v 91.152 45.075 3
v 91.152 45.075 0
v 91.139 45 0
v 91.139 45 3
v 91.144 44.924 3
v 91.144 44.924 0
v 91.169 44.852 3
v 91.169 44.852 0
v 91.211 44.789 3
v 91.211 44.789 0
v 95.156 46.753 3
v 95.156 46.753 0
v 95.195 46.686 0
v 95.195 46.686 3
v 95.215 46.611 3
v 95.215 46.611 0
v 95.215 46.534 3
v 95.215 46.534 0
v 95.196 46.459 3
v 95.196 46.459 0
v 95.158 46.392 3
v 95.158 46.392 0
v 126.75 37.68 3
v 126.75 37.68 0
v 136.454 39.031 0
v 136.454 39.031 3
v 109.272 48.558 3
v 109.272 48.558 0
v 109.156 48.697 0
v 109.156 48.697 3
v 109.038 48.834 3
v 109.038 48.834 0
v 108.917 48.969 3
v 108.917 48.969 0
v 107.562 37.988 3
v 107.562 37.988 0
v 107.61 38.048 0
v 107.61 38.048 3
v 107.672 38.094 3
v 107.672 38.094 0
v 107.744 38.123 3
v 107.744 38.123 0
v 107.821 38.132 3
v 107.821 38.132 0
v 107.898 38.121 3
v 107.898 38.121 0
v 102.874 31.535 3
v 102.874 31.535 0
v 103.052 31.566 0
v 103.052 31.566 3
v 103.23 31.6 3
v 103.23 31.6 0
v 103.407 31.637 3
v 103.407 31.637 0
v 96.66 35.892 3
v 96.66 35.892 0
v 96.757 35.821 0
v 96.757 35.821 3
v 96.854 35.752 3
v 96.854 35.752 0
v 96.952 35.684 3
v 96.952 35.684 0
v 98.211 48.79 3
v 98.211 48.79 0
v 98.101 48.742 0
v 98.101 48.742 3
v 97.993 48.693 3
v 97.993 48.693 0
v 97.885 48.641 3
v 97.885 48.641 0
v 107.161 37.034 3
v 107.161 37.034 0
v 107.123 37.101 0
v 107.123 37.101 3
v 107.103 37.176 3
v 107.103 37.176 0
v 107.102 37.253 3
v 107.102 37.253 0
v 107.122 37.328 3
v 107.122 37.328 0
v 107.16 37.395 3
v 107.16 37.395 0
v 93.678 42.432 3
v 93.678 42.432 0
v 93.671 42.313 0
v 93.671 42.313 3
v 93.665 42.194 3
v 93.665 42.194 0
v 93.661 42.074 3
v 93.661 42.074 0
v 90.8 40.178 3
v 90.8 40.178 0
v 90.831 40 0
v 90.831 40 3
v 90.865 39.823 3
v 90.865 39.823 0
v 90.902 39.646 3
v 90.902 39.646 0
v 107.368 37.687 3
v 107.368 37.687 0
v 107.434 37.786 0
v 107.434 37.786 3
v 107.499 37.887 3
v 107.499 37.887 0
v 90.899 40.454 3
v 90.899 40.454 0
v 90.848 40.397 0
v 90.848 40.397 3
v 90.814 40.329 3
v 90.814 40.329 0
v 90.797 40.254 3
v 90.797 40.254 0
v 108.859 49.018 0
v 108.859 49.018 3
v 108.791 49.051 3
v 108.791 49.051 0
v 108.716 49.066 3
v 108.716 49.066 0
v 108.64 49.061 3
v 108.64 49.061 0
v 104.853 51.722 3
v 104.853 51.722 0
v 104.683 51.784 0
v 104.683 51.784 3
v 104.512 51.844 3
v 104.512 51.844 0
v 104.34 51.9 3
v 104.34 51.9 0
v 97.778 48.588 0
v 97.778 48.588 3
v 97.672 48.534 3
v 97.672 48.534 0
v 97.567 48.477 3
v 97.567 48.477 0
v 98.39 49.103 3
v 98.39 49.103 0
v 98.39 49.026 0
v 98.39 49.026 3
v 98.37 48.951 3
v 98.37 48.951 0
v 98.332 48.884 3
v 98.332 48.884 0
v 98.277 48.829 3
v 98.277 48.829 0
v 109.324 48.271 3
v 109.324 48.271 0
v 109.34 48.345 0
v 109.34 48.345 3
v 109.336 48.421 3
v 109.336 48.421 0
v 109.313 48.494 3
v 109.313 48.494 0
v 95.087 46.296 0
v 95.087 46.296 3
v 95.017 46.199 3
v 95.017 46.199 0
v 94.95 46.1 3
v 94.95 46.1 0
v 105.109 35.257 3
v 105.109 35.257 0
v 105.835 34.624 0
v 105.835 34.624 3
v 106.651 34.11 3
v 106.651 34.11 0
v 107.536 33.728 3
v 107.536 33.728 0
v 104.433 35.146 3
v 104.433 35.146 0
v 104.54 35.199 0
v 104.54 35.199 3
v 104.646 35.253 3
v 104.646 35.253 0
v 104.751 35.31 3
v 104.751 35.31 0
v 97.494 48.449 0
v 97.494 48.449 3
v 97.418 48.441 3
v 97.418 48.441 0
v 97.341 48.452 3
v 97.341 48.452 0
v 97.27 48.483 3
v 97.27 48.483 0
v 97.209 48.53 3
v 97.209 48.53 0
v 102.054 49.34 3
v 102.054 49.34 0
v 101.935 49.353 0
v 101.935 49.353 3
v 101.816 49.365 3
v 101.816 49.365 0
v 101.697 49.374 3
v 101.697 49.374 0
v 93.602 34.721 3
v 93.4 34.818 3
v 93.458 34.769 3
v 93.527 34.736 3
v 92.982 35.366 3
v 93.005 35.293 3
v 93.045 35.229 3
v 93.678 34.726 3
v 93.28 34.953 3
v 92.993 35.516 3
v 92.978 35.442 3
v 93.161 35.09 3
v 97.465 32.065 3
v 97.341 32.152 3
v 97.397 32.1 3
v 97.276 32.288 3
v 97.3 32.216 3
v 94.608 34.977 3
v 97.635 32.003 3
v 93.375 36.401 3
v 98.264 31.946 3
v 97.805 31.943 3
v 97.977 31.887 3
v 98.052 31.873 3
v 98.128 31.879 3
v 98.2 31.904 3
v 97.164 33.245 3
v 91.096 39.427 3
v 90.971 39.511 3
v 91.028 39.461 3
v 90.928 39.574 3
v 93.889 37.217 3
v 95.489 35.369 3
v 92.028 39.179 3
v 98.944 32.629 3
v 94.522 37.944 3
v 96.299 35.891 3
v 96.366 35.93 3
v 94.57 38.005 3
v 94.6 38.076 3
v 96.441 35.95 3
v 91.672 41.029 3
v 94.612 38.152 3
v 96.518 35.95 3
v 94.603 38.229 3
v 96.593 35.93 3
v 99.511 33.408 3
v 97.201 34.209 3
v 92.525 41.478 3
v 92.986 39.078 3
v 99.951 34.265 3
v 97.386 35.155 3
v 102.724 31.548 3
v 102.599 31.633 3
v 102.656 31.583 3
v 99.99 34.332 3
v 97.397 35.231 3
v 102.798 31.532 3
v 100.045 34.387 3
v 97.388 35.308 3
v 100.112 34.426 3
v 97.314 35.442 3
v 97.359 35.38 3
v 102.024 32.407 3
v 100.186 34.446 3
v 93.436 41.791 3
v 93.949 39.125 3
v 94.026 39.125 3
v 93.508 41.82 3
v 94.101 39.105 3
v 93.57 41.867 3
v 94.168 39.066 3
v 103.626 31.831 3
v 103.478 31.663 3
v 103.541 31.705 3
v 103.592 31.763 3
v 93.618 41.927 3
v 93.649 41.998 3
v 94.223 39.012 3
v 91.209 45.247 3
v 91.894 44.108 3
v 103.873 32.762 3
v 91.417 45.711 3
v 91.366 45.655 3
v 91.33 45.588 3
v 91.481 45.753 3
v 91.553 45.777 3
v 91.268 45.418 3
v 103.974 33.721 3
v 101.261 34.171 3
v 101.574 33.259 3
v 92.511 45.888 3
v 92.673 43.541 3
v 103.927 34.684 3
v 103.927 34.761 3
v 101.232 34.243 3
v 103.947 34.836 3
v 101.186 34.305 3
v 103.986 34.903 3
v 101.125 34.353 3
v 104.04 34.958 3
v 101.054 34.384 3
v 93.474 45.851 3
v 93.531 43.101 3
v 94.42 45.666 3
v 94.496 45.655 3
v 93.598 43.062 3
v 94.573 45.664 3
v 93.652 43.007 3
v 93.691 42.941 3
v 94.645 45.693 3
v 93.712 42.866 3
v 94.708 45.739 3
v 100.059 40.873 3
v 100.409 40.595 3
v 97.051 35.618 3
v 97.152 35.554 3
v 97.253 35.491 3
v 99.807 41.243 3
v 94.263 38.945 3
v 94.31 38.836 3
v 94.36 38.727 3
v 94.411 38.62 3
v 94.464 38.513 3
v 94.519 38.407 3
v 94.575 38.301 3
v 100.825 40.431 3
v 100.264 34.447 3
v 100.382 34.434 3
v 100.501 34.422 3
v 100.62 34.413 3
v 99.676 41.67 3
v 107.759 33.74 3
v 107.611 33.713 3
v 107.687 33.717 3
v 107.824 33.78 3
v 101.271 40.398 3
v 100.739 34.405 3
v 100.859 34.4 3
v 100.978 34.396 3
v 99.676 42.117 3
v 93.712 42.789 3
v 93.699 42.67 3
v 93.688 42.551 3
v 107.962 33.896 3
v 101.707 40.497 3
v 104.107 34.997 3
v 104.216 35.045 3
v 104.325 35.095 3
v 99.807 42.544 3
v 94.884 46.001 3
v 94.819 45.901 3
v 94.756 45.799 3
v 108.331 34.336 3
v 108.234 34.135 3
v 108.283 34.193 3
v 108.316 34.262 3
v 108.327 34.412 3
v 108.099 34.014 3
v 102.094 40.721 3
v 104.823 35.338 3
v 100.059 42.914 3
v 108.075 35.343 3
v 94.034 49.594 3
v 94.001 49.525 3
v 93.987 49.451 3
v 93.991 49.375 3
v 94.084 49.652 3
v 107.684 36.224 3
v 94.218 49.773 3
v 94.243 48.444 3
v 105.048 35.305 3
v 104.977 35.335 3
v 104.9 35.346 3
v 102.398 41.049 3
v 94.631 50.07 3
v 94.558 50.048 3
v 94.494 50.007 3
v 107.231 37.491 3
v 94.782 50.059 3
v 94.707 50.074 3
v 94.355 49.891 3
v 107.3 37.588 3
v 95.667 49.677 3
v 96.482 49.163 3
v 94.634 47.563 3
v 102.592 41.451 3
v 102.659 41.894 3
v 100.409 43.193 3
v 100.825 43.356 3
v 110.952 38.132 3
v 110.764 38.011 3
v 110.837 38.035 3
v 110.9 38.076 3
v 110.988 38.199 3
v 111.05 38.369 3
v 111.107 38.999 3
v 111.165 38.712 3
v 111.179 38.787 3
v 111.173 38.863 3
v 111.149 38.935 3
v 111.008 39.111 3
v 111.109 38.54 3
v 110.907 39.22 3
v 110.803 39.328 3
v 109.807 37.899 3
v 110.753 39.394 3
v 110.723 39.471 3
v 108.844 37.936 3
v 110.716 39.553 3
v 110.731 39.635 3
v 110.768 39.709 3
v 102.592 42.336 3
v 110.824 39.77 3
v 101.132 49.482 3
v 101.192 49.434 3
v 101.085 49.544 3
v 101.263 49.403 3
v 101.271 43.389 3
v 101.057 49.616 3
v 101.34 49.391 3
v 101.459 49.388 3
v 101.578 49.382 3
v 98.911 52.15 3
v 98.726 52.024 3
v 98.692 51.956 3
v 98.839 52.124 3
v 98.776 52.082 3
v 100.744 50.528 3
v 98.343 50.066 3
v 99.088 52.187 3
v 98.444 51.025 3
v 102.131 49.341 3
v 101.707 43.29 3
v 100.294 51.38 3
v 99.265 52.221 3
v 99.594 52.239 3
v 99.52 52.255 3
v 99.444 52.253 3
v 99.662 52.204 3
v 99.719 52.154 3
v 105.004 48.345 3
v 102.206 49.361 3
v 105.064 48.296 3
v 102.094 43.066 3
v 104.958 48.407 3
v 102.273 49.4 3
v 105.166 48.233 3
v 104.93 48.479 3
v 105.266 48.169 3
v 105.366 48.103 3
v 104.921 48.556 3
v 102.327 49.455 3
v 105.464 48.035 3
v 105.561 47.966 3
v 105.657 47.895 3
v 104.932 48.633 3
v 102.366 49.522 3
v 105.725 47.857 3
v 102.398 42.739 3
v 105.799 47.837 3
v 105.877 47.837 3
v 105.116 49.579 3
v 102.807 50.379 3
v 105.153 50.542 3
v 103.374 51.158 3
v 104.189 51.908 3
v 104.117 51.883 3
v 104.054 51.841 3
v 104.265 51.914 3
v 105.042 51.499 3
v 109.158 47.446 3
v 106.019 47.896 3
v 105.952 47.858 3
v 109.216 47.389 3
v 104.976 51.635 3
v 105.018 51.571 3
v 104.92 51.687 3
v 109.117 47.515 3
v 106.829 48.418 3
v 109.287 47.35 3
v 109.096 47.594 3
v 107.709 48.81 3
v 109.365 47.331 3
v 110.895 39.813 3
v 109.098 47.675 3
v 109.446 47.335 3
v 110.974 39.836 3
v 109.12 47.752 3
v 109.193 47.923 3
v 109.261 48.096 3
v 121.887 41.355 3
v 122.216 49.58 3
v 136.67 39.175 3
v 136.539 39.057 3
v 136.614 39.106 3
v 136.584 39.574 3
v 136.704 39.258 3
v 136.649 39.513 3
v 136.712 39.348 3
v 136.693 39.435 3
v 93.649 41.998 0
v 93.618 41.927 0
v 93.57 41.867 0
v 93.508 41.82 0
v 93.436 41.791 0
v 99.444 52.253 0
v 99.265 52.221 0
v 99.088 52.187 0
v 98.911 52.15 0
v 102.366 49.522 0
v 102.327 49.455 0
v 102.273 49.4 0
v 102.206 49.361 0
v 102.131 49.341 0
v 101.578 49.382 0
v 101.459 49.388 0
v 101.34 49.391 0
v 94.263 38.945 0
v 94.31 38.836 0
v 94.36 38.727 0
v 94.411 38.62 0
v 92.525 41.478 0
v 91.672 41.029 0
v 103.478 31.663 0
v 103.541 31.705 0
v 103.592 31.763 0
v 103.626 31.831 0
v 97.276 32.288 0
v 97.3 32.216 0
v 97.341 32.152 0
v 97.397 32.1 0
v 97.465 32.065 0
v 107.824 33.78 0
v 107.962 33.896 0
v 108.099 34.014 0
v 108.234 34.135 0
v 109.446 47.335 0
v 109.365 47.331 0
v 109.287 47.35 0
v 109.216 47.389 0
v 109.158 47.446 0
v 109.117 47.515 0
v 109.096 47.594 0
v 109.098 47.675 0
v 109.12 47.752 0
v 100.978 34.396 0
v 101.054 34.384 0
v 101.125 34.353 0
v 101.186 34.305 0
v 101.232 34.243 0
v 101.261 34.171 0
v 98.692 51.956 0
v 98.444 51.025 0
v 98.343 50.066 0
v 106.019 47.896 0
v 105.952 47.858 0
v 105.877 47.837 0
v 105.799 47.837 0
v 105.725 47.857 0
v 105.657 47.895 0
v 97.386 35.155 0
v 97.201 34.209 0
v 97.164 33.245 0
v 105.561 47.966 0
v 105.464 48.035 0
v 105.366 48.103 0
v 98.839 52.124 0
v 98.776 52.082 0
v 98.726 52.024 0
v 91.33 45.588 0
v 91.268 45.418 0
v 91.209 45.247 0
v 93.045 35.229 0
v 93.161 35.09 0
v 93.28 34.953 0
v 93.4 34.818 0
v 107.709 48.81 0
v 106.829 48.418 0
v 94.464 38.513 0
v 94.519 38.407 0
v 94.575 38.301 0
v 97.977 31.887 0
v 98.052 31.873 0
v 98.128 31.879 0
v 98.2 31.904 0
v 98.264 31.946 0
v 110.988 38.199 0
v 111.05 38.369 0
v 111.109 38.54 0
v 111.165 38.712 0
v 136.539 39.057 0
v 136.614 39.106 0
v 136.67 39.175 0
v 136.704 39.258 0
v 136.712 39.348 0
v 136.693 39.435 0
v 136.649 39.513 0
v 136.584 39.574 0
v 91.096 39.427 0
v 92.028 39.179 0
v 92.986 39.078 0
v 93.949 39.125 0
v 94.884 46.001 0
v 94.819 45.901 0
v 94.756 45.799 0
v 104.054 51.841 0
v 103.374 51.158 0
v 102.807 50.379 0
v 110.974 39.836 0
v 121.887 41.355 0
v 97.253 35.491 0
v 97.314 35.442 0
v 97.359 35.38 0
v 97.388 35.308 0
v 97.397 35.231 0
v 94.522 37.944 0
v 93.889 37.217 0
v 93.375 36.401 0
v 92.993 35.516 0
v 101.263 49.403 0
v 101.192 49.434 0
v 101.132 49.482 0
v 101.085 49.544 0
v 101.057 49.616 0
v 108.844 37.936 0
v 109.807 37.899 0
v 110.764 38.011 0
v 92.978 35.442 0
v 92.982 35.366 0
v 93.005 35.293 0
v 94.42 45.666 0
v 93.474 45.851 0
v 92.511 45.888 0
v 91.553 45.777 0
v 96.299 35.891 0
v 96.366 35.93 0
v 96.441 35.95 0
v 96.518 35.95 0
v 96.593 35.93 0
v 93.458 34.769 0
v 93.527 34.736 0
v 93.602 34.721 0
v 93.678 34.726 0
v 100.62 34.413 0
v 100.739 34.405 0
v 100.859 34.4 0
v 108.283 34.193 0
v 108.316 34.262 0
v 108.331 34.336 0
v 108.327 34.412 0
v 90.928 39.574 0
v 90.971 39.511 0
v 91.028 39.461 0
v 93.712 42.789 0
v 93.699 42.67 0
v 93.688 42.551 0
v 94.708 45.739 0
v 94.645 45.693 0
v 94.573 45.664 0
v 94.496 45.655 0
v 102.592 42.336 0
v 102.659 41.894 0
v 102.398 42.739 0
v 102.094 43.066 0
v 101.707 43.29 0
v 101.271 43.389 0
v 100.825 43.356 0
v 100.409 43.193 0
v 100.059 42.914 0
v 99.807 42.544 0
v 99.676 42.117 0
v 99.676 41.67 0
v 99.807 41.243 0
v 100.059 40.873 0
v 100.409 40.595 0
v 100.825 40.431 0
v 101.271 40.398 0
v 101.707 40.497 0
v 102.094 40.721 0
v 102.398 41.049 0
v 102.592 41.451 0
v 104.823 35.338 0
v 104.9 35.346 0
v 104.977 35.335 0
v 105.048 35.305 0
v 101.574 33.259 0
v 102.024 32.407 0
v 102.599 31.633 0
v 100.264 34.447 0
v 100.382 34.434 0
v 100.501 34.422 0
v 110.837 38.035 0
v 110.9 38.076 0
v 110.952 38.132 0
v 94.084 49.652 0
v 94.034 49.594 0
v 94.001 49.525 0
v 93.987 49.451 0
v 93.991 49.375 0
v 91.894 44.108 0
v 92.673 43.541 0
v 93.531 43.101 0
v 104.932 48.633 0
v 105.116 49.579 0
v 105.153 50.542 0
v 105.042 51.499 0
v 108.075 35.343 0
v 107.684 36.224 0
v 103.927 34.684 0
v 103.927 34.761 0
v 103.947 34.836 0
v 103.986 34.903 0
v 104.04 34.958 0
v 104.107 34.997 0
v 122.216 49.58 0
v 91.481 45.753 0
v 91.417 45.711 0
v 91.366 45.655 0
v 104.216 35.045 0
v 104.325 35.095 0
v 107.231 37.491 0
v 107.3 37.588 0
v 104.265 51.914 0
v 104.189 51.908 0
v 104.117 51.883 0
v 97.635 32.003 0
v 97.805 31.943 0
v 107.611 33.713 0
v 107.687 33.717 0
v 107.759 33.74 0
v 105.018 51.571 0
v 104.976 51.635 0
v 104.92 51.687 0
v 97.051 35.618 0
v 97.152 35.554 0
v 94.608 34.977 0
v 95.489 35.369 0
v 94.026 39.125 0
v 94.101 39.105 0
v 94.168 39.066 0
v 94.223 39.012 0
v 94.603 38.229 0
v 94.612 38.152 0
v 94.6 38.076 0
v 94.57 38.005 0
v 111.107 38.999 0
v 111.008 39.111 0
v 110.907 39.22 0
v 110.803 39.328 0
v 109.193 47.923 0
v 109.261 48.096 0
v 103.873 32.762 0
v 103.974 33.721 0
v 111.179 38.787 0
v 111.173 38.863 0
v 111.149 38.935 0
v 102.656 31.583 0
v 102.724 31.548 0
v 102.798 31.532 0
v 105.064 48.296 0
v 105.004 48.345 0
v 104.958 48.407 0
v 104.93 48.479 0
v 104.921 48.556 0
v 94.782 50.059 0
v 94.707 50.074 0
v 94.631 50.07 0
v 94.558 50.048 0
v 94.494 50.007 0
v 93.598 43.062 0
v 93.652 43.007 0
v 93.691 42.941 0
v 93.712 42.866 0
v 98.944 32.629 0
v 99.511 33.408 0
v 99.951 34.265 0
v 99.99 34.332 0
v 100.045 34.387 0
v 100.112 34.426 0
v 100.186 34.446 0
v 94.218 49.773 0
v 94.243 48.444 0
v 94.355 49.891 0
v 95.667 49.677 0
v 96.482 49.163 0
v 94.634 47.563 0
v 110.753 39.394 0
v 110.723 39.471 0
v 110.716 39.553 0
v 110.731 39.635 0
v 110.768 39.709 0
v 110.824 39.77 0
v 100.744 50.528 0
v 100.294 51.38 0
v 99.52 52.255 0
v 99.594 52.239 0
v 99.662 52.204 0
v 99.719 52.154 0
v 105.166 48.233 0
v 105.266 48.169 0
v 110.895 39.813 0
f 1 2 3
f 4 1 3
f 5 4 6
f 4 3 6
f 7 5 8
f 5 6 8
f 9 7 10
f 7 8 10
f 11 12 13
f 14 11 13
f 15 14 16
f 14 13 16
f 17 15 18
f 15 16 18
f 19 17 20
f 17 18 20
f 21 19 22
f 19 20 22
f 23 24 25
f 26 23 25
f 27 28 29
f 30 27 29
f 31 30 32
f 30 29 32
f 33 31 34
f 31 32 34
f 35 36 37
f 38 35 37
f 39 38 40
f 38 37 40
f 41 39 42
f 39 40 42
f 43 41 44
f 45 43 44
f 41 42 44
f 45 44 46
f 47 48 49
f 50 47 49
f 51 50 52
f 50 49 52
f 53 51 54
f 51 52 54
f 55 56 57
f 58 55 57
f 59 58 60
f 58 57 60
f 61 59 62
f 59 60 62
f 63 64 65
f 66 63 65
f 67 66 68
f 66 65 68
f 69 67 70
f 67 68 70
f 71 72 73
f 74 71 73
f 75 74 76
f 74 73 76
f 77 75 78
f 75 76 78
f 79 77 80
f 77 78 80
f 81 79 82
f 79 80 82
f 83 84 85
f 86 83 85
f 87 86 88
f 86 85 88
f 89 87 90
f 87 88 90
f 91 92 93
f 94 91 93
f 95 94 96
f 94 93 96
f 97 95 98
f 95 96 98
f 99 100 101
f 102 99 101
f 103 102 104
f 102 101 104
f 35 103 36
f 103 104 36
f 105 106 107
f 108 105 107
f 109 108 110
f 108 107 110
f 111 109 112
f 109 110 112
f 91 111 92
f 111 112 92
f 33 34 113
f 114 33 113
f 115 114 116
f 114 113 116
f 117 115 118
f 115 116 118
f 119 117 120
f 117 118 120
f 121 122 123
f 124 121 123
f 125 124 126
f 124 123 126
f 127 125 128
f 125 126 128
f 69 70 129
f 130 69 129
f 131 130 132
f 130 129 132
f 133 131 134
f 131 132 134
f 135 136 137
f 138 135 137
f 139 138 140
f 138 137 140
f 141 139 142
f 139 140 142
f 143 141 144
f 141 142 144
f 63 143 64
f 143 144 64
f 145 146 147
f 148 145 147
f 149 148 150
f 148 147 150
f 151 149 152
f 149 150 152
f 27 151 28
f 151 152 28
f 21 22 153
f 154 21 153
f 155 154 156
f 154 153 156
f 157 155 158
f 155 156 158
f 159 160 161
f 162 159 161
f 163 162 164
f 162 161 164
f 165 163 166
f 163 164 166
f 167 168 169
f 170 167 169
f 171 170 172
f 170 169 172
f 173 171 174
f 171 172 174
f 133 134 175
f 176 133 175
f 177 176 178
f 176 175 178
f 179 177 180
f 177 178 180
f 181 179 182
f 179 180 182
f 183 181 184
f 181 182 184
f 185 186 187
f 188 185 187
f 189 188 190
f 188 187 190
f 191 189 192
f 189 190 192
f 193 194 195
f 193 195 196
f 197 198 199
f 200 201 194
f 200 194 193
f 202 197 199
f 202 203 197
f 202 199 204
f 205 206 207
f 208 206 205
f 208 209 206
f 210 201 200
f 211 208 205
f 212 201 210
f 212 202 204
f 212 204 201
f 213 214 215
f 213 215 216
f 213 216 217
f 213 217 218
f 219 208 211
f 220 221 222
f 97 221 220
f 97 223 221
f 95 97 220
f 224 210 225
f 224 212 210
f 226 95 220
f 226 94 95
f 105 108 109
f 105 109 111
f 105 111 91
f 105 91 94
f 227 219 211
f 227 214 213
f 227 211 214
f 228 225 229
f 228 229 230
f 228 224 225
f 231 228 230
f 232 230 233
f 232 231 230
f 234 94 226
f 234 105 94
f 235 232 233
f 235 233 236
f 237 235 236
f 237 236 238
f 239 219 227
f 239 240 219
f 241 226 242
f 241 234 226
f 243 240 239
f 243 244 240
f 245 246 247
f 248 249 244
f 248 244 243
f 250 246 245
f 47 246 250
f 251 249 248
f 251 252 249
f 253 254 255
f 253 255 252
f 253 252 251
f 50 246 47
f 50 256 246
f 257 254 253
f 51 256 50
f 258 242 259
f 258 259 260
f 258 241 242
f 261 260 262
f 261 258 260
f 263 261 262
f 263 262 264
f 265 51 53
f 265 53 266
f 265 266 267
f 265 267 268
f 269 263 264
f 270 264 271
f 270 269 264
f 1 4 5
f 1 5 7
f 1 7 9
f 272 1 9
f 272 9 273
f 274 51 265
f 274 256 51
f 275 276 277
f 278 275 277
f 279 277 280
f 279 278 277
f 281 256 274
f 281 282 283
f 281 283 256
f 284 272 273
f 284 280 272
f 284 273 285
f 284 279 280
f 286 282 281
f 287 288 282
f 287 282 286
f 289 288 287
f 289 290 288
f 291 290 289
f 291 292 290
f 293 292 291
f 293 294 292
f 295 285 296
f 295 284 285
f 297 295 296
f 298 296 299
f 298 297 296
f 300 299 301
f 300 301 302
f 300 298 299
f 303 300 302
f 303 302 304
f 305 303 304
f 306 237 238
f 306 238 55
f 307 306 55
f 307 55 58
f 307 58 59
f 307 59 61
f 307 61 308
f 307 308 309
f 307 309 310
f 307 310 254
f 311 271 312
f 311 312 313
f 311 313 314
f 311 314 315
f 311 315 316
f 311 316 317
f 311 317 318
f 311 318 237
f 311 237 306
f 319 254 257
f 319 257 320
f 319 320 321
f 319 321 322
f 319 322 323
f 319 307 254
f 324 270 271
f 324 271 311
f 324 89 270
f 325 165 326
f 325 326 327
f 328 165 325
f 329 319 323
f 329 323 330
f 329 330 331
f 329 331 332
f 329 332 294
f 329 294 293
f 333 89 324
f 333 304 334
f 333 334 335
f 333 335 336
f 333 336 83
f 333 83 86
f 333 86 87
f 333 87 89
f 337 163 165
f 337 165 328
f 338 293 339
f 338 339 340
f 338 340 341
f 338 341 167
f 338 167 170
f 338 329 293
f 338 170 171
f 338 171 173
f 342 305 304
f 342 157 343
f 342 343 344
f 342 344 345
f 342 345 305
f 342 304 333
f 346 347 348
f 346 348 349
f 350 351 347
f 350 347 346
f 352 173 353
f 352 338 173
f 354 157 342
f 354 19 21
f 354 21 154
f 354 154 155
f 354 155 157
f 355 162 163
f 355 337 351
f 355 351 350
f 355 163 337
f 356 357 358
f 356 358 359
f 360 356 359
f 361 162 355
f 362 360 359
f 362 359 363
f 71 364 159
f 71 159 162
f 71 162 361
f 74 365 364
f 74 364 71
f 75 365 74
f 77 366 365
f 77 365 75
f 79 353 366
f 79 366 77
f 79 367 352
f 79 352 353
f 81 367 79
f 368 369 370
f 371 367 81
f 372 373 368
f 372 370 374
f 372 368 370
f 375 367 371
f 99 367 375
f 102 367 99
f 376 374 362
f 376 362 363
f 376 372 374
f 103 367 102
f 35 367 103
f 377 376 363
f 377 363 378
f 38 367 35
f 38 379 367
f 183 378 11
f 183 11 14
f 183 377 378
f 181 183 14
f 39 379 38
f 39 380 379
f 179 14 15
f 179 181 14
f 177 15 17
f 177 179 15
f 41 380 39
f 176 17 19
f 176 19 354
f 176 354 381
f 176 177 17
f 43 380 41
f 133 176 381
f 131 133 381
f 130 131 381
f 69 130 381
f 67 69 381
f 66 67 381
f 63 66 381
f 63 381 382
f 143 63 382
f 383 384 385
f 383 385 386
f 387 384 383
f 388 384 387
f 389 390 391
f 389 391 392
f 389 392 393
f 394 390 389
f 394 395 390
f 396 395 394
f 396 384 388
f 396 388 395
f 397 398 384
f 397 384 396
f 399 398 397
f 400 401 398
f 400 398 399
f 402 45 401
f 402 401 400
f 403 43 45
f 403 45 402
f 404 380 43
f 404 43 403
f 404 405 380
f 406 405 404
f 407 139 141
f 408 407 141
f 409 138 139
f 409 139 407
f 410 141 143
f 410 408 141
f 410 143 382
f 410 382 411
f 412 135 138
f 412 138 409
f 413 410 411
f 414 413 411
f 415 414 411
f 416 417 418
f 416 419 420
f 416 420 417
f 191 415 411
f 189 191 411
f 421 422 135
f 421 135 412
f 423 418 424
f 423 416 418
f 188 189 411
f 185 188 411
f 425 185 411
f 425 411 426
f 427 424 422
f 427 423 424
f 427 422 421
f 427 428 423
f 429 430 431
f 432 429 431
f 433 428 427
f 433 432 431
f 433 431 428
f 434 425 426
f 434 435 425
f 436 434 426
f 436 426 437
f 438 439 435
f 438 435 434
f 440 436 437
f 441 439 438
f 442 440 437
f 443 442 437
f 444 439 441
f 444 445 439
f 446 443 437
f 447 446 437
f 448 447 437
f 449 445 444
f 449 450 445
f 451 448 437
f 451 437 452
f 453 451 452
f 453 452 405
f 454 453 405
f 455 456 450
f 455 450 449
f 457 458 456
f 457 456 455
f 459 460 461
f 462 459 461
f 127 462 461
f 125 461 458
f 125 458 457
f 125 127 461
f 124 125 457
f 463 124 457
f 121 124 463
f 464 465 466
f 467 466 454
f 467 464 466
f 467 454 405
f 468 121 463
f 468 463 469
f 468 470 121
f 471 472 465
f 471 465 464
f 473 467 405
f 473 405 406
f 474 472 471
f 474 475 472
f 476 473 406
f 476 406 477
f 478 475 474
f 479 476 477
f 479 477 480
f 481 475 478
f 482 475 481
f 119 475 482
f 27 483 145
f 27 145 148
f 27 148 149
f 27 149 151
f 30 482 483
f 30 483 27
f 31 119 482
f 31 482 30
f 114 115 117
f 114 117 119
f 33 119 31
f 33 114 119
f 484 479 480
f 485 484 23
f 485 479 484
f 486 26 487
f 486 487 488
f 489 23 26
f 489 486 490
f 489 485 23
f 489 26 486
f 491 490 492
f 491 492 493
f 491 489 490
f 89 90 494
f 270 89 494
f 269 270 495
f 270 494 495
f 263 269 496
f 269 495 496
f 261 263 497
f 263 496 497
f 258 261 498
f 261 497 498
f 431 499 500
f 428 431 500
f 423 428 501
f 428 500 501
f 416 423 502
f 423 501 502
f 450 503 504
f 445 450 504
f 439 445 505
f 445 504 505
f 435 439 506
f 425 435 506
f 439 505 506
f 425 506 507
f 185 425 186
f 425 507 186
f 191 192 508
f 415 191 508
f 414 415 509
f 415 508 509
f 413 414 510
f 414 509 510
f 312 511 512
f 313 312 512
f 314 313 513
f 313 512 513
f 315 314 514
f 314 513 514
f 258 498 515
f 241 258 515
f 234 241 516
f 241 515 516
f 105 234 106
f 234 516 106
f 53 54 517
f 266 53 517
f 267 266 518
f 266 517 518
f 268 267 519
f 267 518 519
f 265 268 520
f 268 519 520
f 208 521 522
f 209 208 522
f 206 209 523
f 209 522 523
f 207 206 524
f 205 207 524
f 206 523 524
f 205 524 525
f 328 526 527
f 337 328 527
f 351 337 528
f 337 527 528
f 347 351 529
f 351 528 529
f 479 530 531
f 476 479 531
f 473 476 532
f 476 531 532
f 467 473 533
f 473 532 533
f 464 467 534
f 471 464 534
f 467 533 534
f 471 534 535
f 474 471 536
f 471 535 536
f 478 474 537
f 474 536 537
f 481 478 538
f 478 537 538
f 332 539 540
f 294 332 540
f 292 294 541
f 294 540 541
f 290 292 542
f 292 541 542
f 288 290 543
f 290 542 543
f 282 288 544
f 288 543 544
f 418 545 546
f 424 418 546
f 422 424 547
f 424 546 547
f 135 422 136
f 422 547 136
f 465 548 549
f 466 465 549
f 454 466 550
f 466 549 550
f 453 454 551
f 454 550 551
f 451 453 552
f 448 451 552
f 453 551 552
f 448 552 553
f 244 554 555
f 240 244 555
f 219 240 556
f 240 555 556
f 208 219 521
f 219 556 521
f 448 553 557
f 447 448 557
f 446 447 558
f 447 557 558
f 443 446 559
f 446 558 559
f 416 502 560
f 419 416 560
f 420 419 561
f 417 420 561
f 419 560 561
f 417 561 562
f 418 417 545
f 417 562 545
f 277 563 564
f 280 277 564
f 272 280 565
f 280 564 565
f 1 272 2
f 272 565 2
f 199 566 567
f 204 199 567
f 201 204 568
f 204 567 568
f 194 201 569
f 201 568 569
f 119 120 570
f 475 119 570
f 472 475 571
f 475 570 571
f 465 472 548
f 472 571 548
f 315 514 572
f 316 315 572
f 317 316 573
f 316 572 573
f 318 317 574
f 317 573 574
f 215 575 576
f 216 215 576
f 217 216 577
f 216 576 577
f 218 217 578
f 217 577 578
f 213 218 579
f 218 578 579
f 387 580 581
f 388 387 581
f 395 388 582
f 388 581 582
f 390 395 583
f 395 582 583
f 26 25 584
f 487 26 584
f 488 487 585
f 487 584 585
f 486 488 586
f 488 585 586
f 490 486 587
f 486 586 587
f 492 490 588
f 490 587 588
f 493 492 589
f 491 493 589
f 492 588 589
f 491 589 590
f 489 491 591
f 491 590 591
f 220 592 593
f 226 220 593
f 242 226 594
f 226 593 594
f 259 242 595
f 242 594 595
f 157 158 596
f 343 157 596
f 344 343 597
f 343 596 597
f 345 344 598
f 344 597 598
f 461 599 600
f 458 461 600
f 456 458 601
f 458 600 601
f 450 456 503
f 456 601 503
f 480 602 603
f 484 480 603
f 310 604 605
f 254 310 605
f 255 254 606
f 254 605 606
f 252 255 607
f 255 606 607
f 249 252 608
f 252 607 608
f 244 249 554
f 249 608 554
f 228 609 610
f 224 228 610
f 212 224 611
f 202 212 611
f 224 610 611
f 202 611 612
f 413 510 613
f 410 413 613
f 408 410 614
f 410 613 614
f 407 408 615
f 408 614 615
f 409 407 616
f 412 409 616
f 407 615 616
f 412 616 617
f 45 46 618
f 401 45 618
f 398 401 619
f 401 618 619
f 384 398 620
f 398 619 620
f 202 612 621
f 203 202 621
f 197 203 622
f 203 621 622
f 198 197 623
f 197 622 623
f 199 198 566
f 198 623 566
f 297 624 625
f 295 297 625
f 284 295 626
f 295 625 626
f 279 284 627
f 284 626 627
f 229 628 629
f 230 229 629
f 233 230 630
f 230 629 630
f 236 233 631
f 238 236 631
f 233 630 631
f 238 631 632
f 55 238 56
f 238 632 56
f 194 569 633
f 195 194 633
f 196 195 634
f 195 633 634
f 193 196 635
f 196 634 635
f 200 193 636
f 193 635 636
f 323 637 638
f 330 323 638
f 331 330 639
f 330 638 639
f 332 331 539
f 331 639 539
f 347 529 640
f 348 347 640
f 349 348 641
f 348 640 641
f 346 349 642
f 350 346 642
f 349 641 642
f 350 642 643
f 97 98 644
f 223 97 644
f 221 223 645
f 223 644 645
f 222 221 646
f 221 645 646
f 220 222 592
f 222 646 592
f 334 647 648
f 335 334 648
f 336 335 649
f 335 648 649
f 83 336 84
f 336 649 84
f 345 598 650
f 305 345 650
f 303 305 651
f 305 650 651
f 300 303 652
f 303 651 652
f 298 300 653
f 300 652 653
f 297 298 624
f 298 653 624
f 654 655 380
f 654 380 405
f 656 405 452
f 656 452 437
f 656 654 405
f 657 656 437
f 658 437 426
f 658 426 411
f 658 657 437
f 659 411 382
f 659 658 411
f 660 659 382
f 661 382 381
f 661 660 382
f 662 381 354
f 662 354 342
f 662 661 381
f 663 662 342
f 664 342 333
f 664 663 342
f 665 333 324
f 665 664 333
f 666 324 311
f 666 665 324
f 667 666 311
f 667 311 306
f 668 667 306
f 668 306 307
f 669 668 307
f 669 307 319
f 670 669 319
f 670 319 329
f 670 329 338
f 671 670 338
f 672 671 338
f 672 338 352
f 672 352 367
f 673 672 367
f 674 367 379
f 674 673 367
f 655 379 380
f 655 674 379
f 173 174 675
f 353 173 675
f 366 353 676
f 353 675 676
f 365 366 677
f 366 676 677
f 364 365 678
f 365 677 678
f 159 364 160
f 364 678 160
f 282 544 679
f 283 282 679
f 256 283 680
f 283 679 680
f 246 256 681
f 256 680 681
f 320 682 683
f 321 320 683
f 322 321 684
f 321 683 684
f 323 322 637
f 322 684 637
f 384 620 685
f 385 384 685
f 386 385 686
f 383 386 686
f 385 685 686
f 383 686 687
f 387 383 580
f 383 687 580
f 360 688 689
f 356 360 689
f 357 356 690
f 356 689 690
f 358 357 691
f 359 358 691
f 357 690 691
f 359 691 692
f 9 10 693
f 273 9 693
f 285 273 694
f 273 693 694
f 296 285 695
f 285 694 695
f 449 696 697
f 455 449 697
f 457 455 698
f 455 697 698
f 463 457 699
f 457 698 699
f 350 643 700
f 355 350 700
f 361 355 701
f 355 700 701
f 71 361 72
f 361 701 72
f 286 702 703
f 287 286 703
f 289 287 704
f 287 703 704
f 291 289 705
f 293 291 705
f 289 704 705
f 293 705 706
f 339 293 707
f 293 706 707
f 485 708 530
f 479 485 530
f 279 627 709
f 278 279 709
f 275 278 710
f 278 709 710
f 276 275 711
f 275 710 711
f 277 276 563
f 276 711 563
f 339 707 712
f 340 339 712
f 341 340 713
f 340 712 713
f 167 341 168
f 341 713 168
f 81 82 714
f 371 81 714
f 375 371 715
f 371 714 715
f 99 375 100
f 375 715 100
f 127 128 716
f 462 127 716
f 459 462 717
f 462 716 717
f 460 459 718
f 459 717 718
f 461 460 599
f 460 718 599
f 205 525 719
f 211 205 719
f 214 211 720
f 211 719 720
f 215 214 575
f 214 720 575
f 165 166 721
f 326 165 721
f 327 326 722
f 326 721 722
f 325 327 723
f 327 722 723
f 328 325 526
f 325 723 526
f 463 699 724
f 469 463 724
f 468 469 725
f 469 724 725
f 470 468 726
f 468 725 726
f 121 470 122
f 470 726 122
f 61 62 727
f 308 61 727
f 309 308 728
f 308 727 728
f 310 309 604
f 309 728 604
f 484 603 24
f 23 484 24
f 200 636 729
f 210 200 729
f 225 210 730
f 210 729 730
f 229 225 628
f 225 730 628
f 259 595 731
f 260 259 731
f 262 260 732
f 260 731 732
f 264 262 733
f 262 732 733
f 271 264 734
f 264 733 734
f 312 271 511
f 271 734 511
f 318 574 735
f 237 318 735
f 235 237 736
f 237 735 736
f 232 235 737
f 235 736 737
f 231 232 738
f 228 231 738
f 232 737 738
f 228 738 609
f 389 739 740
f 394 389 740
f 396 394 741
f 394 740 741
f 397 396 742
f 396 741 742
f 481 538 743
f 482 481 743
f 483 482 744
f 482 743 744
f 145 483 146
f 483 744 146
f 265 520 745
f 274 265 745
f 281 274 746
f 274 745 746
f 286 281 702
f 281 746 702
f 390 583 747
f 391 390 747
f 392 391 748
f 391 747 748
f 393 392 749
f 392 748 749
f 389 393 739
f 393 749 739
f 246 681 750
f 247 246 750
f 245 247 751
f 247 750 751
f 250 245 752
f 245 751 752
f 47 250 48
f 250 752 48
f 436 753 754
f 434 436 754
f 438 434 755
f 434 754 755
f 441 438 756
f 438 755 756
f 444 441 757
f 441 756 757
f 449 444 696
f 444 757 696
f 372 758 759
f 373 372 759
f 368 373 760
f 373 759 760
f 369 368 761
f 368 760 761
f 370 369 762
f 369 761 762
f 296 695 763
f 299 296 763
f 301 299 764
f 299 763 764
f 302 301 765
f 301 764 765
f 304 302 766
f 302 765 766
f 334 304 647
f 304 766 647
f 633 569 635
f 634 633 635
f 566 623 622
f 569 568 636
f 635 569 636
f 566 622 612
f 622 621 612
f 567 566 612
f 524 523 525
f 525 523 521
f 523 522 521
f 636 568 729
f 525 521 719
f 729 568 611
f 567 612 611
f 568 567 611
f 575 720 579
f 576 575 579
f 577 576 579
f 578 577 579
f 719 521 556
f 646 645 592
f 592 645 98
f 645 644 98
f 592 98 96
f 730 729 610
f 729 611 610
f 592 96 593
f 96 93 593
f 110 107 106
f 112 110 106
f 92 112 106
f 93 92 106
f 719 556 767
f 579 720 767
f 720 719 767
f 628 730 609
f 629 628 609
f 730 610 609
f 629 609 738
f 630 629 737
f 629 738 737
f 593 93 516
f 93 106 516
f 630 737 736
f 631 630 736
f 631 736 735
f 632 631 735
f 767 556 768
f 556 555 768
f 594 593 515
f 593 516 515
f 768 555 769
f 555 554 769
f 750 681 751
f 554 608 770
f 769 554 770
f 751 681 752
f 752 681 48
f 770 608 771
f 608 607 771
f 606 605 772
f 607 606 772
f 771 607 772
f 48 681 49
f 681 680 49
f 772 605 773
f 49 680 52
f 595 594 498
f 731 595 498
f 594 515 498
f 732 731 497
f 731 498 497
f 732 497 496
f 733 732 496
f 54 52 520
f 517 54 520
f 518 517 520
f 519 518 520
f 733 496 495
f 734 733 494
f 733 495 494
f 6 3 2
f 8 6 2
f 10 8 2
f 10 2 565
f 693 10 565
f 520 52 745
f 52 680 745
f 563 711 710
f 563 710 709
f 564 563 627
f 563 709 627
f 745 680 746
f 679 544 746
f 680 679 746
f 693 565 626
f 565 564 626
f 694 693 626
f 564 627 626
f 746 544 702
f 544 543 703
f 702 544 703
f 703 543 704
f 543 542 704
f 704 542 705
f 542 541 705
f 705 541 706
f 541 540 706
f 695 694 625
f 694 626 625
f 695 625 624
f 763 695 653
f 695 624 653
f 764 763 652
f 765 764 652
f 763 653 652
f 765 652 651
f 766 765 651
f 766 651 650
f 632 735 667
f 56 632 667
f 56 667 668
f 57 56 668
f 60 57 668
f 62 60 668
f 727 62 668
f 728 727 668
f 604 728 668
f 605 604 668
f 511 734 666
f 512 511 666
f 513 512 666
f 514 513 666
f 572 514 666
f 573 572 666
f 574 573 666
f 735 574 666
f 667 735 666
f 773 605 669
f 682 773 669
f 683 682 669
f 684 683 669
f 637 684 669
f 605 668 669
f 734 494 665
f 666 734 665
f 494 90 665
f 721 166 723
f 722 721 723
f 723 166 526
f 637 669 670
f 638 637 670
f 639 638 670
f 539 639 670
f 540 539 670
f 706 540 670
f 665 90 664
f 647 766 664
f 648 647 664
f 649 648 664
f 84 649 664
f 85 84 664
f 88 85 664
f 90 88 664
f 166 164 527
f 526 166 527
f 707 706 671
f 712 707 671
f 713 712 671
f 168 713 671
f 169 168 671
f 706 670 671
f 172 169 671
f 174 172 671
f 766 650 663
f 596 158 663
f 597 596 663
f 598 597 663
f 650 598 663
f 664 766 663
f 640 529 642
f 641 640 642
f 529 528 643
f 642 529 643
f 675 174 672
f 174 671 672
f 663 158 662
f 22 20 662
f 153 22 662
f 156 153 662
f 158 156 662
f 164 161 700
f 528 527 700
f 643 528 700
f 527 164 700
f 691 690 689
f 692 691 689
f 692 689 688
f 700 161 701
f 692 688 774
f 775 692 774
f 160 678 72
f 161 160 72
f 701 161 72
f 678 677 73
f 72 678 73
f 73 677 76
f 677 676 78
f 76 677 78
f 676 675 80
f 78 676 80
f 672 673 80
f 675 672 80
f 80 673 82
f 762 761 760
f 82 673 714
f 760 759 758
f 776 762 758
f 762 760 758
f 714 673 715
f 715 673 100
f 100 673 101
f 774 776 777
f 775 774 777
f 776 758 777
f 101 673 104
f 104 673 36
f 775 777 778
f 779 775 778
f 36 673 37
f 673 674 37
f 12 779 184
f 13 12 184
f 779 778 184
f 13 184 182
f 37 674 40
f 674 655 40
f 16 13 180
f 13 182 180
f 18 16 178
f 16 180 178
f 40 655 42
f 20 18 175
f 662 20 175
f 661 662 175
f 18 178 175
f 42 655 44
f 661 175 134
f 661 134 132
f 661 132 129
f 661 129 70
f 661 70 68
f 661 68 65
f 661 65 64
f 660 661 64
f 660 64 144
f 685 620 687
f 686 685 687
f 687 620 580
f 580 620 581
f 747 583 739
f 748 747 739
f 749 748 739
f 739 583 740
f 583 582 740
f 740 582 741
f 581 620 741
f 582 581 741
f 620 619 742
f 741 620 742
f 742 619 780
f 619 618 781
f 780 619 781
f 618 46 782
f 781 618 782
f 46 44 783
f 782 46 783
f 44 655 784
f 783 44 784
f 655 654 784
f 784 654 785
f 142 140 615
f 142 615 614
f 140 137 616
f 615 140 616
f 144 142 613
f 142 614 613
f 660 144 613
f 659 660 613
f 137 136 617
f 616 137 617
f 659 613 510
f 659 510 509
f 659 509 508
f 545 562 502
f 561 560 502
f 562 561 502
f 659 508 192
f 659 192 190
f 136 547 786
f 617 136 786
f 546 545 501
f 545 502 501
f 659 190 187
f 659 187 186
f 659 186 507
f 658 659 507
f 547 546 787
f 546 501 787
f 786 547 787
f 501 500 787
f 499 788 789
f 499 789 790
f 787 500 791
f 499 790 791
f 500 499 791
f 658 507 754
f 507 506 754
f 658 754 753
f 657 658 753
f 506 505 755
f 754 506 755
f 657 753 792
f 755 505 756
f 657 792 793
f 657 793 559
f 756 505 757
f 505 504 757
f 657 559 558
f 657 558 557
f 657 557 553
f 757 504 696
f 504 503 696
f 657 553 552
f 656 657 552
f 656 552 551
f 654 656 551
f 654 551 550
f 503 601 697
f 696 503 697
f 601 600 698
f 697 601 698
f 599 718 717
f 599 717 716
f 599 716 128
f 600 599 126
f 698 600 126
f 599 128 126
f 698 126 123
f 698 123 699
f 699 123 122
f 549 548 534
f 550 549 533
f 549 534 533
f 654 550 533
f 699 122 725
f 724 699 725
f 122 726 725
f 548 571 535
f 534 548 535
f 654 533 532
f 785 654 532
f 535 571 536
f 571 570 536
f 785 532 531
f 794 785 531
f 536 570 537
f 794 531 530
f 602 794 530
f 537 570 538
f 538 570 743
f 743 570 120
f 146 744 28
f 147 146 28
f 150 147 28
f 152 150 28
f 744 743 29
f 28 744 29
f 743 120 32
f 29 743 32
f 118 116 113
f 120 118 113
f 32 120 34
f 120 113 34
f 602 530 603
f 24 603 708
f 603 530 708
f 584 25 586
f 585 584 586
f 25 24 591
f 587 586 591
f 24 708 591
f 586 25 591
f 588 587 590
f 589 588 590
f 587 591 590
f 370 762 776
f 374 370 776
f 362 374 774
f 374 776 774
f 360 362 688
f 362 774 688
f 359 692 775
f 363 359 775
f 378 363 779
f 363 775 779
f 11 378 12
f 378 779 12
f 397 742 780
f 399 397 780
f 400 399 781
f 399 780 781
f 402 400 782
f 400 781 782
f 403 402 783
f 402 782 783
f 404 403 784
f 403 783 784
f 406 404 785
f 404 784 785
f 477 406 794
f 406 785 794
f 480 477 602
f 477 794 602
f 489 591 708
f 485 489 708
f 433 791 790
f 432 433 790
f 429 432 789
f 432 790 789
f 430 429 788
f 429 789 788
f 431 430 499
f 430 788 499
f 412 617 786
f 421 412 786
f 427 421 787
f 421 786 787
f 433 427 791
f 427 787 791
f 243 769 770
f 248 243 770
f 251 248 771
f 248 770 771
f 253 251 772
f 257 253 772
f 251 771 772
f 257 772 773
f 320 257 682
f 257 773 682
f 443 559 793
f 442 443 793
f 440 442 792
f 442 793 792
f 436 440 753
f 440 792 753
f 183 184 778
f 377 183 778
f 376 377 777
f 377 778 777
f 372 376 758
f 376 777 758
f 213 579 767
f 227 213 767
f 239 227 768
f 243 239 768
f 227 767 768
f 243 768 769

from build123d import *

# Parameters (mm, degrees)
ESQUISSE20_R        = 1.5
BOSS_EXTRU_18_DEPTH = 3


with BuildPart() as part:
    # Esquisse20 → Boss.-Extru.18 (new body)
    with BuildSketch(Plane.XY):
        with BuildLine():
            Line((110.974145272, 39.836071078), (121.886788051, 41.354939341))
            Line((121.886788051, 41.354939341), (126.749523122, 37.68045145))
            Line((126.749523122, 37.68045145), (136.453547574, 39.031099049))
            ThreePointArc((136.453547574, 39.031099049), (136.70394605, 39.25838517), (136.583626314, 39.574425576))
            Line((136.583626314, 39.574425576), (122.215724565, 49.579536305))
            Line((122.215724565, 49.579536305), (109.446142116, 47.334623838))
            ThreePointArc((109.446142116, 47.334623838), (109.157676293, 47.445546281), (109.120229419, 47.752326416))
            ThreePointArc((109.120229419, 47.752326416), (109.228042095, 48.009211598), (109.32429992, 48.270646104))
            ThreePointArc((109.32429992, 48.270646104), (109.335764075, 48.421294196), (109.272350858, 48.558425661))
            ThreePointArc((109.272350858, 48.558425661), (109.097464559, 48.765803687), (108.917279288, 48.968594544))
            ThreePointArc((108.917279288, 48.968594544), (108.79064668, 49.050998774), (108.639910127, 49.061234313))
            ThreePointArc((108.639910127, 49.061234313), (107.261509219, 48.631031321), (106.01862318, 47.895981682))
            ThreePointArc((106.01862318, 47.895981682), (105.838096498, 47.834835241), (105.657168579, 47.894784036))
            ThreePointArc((105.657168579, 47.894784036), (105.512617586, 48.000463717), (105.365584876, 48.10266238))
            ThreePointArc((105.365584876, 48.10266238), (105.21615426, 48.20132177), (105.064410914, 48.296385651))
            ThreePointArc((105.064410914, 48.296385651), (104.94165105, 48.44218958), (104.931503697, 48.632520348))
            ThreePointArc((104.931503697, 48.632520348), (105.15332497, 50.059355658), (105.041782665, 51.499016031))
            ThreePointArc((105.041782665, 51.499016031), (104.976386869, 51.635213184), (104.85290368, 51.722265908))
            ThreePointArc((104.85290368, 51.722265908), (104.597758689, 51.814417397), (104.340318239, 51.899946795))
            ThreePointArc((104.340318239, 51.899946795), (104.189449068, 51.907994647), (104.053789615, 51.841490608))
            ThreePointArc((104.053789615, 51.841490608), (103.075160908, 50.779723434), (102.366314843, 49.521708754))
            ThreePointArc((102.366314843, 49.521708754), (102.240547371, 49.378491042), (102.053884799, 49.339944262))
            ThreePointArc((102.053884799, 49.339944262), (101.875860127, 49.359190054), (101.697426734, 49.374180337))
            ThreePointArc((101.697426734, 49.374180337), (101.518686329, 49.384906567), (101.339740796, 49.39136263))
            ThreePointArc((101.339740796, 49.39136263), (101.160525671, 49.456252605), (101.056572421, 49.616010208))
            ThreePointArc((101.056572421, 49.616010208), (100.535257624, 50.96259647), (99.718828968, 52.153607774))
            ThreePointArc((99.718828968, 52.153607774), (99.59409597, 52.23886007), (99.44363003, 52.252508346))
            ThreePointArc((99.44363003, 52.252508346), (99.176592242, 52.204741381), (98.910877573, 52.150091787))
            ThreePointArc((98.910877573, 52.150091787), (98.776197112, 52.081626847), (98.691964599, 51.956202932))
            ThreePointArc((98.691964599, 51.956202932), (98.375330865, 50.547371233), (98.390459505, 49.10347553))
            ThreePointArc((98.390459505, 49.10347553), (98.353150535, 48.916561617), (98.210769396, 48.78984784))
            ThreePointArc((98.210769396, 48.78984784), (98.046972612, 48.717502849), (97.884949619, 48.641268118))
            ThreePointArc((97.884949619, 48.641268118), (97.724792772, 48.561187104), (97.566593363, 48.477305452))
            ThreePointArc((97.566593363, 48.477305452), (97.378943525, 48.443894256), (97.209038568, 48.530271774))
            ThreePointArc((97.209038568, 48.530271774), (96.08427358, 49.435792287), (94.781719971, 50.059024004))
            ThreePointArc((94.781719971, 50.059024004), (94.631071878, 50.070488159), (94.493940414, 50.007074943))
            ThreePointArc((94.493940414, 50.007074943), (94.286562388, 49.832188643), (94.083771531, 49.652003372))
            ThreePointArc((94.083771531, 49.652003372), (94.001367301, 49.525370764), (93.991131762, 49.374634211))
            ThreePointArc((93.991131762, 49.374634211), (94.421334754, 47.996233303), (95.156384393, 46.753347264))
            ThreePointArc((95.156384393, 46.753347264), (95.217530833, 46.572820582), (95.157582038, 46.391892663))
            ThreePointArc((95.157582038, 46.391892663), (95.051902358, 46.24734167), (94.949703695, 46.100308961))
            ThreePointArc((94.949703695, 46.100308961), (94.851044305, 45.950878344), (94.755980424, 45.799134999))
            ThreePointArc((94.755980424, 45.799134999), (94.610176495, 45.676375134), (94.419845727, 45.666227781))
            ThreePointArc((94.419845727, 45.666227781), (92.993010417, 45.888049055), (91.553350043, 45.77650675))
            ThreePointArc((91.553350043, 45.77650675), (91.417152891, 45.711110954), (91.330100167, 45.587627765))
            ThreePointArc((91.330100167, 45.587627765), (91.237948678, 45.332482774), (91.15241928, 45.075042323))
            ThreePointArc((91.15241928, 45.075042323), (91.144371427, 44.924173153), (91.210875467, 44.788513699))
            ThreePointArc((91.210875467, 44.788513699), (92.272642641, 43.809884992), (93.530657321, 43.101038928))
            ThreePointArc((93.530657321, 43.101038928), (93.673875032, 42.975271455), (93.712421813, 42.788608884))
            ThreePointArc((93.712421813, 42.788608884), (93.693176021, 42.610584211), (93.678185738, 42.432150818))
            ThreePointArc((93.678185738, 42.432150818), (93.667459507, 42.253410413), (93.661003444, 42.07446488))
            ThreePointArc((93.661003444, 42.07446488), (93.59611347, 41.895249755), (93.436355867, 41.791296505))
            ThreePointArc((93.436355867, 41.791296505), (92.089769605, 41.269981709), (90.8987583, 40.453553052))
            ThreePointArc((90.8987583, 40.453553052), (90.813506004, 40.328820055), (90.799857729, 40.178354115))
            ThreePointArc((90.799857729, 40.178354115), (90.847624694, 39.911316326), (90.902274287, 39.645601657))
            ThreePointArc((90.902274287, 39.645601657), (90.970739228, 39.510921196), (91.096163143, 39.426688683))
            ThreePointArc((91.096163143, 39.426688683), (92.504994842, 39.110054949), (93.948890545, 39.12518359))
            ThreePointArc((93.948890545, 39.12518359), (94.135804458, 39.08787462), (94.262518234, 38.945493481))
            ThreePointArc((94.262518234, 38.945493481), (94.334863226, 38.781696696), (94.411097956, 38.619673703))
            ThreePointArc((94.411097956, 38.619673703), (94.491178971, 38.459516856), (94.575060623, 38.301317448))
            ThreePointArc((94.575060623, 38.301317448), (94.608471819, 38.113667609), (94.522094301, 37.943762652))
            ThreePointArc((94.522094301, 37.943762652), (93.616573788, 36.818997664), (92.993342071, 35.516444055))
            ThreePointArc((92.993342071, 35.516444055), (92.981877915, 35.365795963), (93.045291132, 35.228664498))
            ThreePointArc((93.045291132, 35.228664498), (93.220177431, 35.021286472), (93.400362702, 34.818495616))
            ThreePointArc((93.400362702, 34.818495616), (93.526995311, 34.736091385), (93.677731863, 34.725855847))
            ThreePointArc((93.677731863, 34.725855847), (95.056132772, 35.156058839), (96.299018811, 35.891108478))
            ThreePointArc((96.299018811, 35.891108478), (96.479545492, 35.952254918), (96.660473412, 35.892306123))
            ThreePointArc((96.660473412, 35.892306123), (96.805024404, 35.786626442), (96.952057114, 35.684427779))
            ThreePointArc((96.952057114, 35.684427779), (97.101487731, 35.585768389), (97.253231076, 35.490704508))
            ThreePointArc((97.253231076, 35.490704508), (97.37599094, 35.344900579), (97.386138294, 35.154569811))
            ThreePointArc((97.386138294, 35.154569811), (97.16431702, 33.727734502), (97.275859325, 32.288074128))
            ThreePointArc((97.275859325, 32.288074128), (97.341255121, 32.151876975), (97.46473831, 32.064824252))
            ThreePointArc((97.46473831, 32.064824252), (97.719883301, 31.972672762), (97.977323751, 31.887143364))
            ThreePointArc((97.977323751, 31.887143364), (98.128192922, 31.879095512), (98.263852376, 31.945599551))
            ThreePointArc((98.263852376, 31.945599551), (99.242481083, 33.007366725), (99.951327147, 34.265381405))
            ThreePointArc((99.951327147, 34.265381405), (100.077094619, 34.408599117), (100.263757191, 34.447145897))
            ThreePointArc((100.263757191, 34.447145897), (100.441781863, 34.427900105), (100.620215257, 34.412909822))
            ThreePointArc((100.620215257, 34.412909822), (100.798955662, 34.402183592), (100.977901194, 34.395727529))
            ThreePointArc((100.977901194, 34.395727529), (101.15711632, 34.330837554), (101.26106957, 34.171079951))
            ThreePointArc((101.26106957, 34.171079951), (101.782384366, 32.824493689), (102.598813023, 31.633482385))
            ThreePointArc((102.598813023, 31.633482385), (102.72354602, 31.548230089), (102.87401196, 31.534581813))
            ThreePointArc((102.87401196, 31.534581813), (103.141049749, 31.582348778), (103.406764418, 31.636998372))
            ThreePointArc((103.406764418, 31.636998372), (103.541444878, 31.705463312), (103.625677392, 31.830887227))
            ThreePointArc((103.625677392, 31.830887227), (103.942311126, 33.239718926), (103.927182485, 34.683614629))
            ThreePointArc((103.927182485, 34.683614629), (103.964491455, 34.870528542), (104.106872594, 34.997242319))
            ThreePointArc((104.106872594, 34.997242319), (104.270669379, 35.06958731), (104.432692372, 35.145822041))
            ThreePointArc((104.432692372, 35.145822041), (104.592849218, 35.225903055), (104.751048627, 35.309784707))
            ThreePointArc((104.751048627, 35.309784707), (104.938698466, 35.343195904), (105.108603422, 35.256818386))
            ThreePointArc((105.108603422, 35.256818386), (106.233368411, 34.351297873), (107.53592202, 33.728066155))
            ThreePointArc((107.53592202, 33.728066155), (107.686570112, 33.716602), (107.823701576, 33.780015217))
            ThreePointArc((107.823701576, 33.780015217), (108.031079603, 33.954901516), (108.233870459, 34.135086787))
            ThreePointArc((108.233870459, 34.135086787), (108.316274689, 34.261719395), (108.326510228, 34.412455948))
            ThreePointArc((108.326510228, 34.412455948), (107.896307236, 35.790856856), (107.161257597, 37.033742895))
            ThreePointArc((107.161257597, 37.033742895), (107.100111157, 37.214269577), (107.160059952, 37.395197496))
            ThreePointArc((107.160059952, 37.395197496), (107.265739633, 37.539748489), (107.367938296, 37.686781199))
            ThreePointArc((107.367938296, 37.686781199), (107.466597686, 37.836211815), (107.561661567, 37.987955161))
            ThreePointArc((107.561661567, 37.987955161), (107.707465496, 38.110715025), (107.897796264, 38.120862378))
            ThreePointArc((107.897796264, 38.120862378), (109.324631573, 37.899041104), (110.764291947, 38.010583409))
            ThreePointArc((110.764291947, 38.010583409), (110.9004891, 38.075979206), (110.987541823, 38.199462394))
            ThreePointArc((110.987541823, 38.199462394), (111.079693313, 38.454607385), (111.165222711, 38.712047836))
            ThreePointArc((111.165222711, 38.712047836), (111.173270563, 38.862917007), (111.106766523, 38.99857646))
            ThreePointArc((111.106766523, 38.99857646), (110.95766042, 39.16577253), (110.802658091, 39.327517495))
            ThreePointArc((110.802658091, 39.327517495), (110.731228871, 39.634793859), (110.974145272, 39.836071078))
        make_face()
        with Locations((101.158820995, 41.89354508)):
            Circle(ESQUISSE20_R, mode=Mode.SUBTRACT)
    extrude(amount=BOSS_EXTRU_18_DEPTH)


solid = part.part
